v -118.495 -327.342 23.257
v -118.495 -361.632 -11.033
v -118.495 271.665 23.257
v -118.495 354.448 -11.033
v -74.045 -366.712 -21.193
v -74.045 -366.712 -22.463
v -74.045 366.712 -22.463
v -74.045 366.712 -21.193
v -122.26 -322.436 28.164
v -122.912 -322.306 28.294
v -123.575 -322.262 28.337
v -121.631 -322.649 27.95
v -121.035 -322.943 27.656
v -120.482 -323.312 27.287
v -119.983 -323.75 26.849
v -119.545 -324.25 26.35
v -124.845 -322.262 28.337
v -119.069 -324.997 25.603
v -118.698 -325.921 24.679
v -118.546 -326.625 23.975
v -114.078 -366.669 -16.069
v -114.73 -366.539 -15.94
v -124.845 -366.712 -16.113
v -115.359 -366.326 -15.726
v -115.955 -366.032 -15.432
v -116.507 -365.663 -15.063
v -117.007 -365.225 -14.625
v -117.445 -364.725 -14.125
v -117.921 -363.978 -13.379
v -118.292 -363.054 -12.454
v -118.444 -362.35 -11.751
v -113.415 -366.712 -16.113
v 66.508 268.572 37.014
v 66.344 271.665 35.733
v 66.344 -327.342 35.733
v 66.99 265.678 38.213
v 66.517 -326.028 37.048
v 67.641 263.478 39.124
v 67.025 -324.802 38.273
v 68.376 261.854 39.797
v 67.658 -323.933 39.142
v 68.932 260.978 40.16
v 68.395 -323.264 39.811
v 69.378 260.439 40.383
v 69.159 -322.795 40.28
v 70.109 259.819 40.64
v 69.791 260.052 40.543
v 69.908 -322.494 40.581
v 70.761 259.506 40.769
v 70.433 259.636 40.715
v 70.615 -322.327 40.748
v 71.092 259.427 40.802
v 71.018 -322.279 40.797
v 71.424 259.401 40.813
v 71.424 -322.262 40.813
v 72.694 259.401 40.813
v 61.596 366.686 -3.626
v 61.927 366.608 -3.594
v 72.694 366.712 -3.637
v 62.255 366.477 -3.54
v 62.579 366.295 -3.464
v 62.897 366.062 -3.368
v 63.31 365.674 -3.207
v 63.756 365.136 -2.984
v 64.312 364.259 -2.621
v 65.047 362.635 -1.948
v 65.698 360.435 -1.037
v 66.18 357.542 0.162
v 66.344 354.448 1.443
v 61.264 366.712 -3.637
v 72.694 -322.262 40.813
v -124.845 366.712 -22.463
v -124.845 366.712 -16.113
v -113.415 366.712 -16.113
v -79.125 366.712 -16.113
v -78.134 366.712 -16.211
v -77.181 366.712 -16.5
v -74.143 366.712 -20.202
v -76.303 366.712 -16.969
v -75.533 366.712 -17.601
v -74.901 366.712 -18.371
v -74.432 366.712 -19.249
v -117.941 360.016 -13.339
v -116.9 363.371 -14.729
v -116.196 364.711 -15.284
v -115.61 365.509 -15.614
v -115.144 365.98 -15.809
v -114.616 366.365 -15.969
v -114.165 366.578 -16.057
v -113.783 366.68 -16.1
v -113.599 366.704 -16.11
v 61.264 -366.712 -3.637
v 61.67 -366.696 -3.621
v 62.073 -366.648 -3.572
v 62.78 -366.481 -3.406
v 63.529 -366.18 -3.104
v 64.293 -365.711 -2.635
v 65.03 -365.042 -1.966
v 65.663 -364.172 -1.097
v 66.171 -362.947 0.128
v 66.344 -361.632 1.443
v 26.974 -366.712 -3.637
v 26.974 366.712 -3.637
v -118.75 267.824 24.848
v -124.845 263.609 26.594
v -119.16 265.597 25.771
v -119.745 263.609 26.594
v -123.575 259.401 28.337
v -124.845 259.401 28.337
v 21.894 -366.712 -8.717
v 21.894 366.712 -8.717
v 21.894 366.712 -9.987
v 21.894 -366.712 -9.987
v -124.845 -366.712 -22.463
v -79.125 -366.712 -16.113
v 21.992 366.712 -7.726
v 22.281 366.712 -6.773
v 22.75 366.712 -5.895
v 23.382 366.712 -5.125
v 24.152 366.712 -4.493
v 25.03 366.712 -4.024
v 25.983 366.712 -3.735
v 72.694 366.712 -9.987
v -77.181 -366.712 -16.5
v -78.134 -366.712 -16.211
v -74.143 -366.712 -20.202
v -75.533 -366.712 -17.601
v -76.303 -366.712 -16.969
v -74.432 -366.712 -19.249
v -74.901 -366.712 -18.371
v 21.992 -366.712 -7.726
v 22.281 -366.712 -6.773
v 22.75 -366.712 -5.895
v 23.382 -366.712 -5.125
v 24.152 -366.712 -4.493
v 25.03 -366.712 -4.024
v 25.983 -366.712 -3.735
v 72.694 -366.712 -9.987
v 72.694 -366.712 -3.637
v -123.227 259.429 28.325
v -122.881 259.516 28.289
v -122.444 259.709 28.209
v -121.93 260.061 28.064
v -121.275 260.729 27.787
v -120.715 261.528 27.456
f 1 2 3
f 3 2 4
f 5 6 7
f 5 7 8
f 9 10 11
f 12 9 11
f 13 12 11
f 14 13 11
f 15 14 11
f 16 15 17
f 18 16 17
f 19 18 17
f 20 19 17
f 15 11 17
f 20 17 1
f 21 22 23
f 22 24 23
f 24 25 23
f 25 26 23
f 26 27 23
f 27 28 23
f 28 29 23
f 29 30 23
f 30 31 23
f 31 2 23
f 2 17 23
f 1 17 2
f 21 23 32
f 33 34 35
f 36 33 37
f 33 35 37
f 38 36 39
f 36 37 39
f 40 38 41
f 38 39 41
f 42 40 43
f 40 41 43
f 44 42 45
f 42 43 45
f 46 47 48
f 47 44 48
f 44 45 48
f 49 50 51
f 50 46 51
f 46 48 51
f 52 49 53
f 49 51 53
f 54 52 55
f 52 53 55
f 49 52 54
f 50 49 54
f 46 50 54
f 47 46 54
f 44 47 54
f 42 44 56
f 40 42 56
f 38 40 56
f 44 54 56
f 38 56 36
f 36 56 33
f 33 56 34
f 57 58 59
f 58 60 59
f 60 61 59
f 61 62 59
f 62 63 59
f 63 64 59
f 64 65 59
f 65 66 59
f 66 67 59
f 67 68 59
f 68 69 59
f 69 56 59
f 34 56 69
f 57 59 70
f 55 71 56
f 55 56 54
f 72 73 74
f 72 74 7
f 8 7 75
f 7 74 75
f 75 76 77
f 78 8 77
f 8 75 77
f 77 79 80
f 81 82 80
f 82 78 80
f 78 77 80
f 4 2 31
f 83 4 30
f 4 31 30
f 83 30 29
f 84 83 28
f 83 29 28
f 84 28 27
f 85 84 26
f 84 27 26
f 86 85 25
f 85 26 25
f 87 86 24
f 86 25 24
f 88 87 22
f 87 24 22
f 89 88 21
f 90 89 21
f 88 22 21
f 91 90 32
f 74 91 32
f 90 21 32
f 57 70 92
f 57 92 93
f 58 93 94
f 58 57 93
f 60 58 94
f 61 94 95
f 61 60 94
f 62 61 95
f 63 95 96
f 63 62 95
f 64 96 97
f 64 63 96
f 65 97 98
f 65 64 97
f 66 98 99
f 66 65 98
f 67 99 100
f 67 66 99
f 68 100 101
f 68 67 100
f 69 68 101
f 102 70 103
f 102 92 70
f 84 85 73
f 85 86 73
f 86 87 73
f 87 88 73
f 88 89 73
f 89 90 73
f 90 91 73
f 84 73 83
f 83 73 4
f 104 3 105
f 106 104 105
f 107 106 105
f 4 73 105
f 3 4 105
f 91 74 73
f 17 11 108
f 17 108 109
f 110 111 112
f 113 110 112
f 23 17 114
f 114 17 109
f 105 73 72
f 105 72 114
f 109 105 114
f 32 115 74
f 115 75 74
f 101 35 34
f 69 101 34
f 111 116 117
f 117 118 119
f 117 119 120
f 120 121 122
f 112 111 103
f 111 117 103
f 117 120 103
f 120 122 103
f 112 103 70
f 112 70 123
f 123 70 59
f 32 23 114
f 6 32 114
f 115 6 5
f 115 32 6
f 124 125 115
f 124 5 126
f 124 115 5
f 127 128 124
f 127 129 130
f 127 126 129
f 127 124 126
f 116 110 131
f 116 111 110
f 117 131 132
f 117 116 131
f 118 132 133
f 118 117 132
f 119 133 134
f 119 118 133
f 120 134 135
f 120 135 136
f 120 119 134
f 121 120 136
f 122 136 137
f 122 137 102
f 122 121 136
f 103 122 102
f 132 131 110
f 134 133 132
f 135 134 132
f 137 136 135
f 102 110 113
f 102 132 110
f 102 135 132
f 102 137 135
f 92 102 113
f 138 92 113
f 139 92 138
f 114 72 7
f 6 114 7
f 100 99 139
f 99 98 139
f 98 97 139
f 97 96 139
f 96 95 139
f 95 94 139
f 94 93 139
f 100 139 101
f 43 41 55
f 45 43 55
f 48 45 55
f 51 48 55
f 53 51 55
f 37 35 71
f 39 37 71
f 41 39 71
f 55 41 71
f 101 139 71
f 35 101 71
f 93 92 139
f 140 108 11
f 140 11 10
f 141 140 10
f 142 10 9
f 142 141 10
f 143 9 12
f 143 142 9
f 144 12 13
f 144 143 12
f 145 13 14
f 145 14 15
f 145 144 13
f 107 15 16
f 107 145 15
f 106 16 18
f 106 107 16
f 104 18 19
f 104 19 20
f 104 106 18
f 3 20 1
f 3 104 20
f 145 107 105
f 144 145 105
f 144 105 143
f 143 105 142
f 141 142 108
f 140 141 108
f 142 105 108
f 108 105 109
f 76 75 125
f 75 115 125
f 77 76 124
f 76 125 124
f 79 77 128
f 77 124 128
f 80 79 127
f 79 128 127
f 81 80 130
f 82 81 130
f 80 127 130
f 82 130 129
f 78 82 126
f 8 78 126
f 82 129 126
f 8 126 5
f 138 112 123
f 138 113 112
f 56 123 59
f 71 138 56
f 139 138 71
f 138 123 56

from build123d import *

# Parameters (mm, degrees)
F1_DEPTH = 366.7125
F2_R     = 5.08
F4_DEPTH = 25.4
F6_DEPTH = 25.4


with BuildPart() as f1:
    # F0 (on Front) → F1 (new body, symmetric)
    with BuildSketch(Plane.XZ):
        Polygon((-124.844931, -22.462923), (-74.044931, -22.462923), (-74.044931, -16.112923), (-118.494931, -16.112923), (-118.494931, 28.337077), (-124.844931, 28.337077), align=None)
        Polygon((21.89406, -9.987138), (72.69406, -9.987138), (72.69406, 40.812862), (66.34406, 40.812862), (66.34406, -3.637138), (21.89406, -3.637138), align=None)
    extrude(amount=F1_DEPTH, both=True)

    # F2
    f2_edges = [f1.edges().sort_by_distance(p)[0] for p in [
        (-118.494931, 0, 28.337077),
        (-118.494931, 0, -16.112923),
        (-74.044931, 0, -16.112923),
        (21.89406, 0, -3.637138),
        (66.34406, 0, -3.637138),
        (66.34406, 0, 40.812862),
    ]]
    fillet(f2_edges, radius=F2_R)

    # F3 (on face) → F4 (cut)
    with BuildSketch(Plane(origin=(-124.844931, 0, 0), x_dir=(0, -1, 0), z_dir=(-1, 0, 0))):
        Polygon((-263.608611, 26.594106), (-259.400707, 28.337077), (-366.7125, 28.337077), (-366.7125, -16.112923), align=None)
        Polygon((322.2625, 28.337077), (366.7125, -16.112923), (366.7125, 28.337077), align=None)
    extrude(amount=-F4_DEPTH, mode=Mode.SUBTRACT)

    # F5 (on face) → F6 (cut)
    with BuildSketch(Plane.YZ.offset(72.69406)):
        Polygon((259.400707, 40.812862), (366.7125, -3.637138), (366.7125, 40.812862), align=None)
        Polygon((-366.7125, -3.637138), (-322.2625, 40.812862), (-366.7125, 40.812862), align=None)
    extrude(amount=-F6_DEPTH, mode=Mode.SUBTRACT)


solid = f1.part
